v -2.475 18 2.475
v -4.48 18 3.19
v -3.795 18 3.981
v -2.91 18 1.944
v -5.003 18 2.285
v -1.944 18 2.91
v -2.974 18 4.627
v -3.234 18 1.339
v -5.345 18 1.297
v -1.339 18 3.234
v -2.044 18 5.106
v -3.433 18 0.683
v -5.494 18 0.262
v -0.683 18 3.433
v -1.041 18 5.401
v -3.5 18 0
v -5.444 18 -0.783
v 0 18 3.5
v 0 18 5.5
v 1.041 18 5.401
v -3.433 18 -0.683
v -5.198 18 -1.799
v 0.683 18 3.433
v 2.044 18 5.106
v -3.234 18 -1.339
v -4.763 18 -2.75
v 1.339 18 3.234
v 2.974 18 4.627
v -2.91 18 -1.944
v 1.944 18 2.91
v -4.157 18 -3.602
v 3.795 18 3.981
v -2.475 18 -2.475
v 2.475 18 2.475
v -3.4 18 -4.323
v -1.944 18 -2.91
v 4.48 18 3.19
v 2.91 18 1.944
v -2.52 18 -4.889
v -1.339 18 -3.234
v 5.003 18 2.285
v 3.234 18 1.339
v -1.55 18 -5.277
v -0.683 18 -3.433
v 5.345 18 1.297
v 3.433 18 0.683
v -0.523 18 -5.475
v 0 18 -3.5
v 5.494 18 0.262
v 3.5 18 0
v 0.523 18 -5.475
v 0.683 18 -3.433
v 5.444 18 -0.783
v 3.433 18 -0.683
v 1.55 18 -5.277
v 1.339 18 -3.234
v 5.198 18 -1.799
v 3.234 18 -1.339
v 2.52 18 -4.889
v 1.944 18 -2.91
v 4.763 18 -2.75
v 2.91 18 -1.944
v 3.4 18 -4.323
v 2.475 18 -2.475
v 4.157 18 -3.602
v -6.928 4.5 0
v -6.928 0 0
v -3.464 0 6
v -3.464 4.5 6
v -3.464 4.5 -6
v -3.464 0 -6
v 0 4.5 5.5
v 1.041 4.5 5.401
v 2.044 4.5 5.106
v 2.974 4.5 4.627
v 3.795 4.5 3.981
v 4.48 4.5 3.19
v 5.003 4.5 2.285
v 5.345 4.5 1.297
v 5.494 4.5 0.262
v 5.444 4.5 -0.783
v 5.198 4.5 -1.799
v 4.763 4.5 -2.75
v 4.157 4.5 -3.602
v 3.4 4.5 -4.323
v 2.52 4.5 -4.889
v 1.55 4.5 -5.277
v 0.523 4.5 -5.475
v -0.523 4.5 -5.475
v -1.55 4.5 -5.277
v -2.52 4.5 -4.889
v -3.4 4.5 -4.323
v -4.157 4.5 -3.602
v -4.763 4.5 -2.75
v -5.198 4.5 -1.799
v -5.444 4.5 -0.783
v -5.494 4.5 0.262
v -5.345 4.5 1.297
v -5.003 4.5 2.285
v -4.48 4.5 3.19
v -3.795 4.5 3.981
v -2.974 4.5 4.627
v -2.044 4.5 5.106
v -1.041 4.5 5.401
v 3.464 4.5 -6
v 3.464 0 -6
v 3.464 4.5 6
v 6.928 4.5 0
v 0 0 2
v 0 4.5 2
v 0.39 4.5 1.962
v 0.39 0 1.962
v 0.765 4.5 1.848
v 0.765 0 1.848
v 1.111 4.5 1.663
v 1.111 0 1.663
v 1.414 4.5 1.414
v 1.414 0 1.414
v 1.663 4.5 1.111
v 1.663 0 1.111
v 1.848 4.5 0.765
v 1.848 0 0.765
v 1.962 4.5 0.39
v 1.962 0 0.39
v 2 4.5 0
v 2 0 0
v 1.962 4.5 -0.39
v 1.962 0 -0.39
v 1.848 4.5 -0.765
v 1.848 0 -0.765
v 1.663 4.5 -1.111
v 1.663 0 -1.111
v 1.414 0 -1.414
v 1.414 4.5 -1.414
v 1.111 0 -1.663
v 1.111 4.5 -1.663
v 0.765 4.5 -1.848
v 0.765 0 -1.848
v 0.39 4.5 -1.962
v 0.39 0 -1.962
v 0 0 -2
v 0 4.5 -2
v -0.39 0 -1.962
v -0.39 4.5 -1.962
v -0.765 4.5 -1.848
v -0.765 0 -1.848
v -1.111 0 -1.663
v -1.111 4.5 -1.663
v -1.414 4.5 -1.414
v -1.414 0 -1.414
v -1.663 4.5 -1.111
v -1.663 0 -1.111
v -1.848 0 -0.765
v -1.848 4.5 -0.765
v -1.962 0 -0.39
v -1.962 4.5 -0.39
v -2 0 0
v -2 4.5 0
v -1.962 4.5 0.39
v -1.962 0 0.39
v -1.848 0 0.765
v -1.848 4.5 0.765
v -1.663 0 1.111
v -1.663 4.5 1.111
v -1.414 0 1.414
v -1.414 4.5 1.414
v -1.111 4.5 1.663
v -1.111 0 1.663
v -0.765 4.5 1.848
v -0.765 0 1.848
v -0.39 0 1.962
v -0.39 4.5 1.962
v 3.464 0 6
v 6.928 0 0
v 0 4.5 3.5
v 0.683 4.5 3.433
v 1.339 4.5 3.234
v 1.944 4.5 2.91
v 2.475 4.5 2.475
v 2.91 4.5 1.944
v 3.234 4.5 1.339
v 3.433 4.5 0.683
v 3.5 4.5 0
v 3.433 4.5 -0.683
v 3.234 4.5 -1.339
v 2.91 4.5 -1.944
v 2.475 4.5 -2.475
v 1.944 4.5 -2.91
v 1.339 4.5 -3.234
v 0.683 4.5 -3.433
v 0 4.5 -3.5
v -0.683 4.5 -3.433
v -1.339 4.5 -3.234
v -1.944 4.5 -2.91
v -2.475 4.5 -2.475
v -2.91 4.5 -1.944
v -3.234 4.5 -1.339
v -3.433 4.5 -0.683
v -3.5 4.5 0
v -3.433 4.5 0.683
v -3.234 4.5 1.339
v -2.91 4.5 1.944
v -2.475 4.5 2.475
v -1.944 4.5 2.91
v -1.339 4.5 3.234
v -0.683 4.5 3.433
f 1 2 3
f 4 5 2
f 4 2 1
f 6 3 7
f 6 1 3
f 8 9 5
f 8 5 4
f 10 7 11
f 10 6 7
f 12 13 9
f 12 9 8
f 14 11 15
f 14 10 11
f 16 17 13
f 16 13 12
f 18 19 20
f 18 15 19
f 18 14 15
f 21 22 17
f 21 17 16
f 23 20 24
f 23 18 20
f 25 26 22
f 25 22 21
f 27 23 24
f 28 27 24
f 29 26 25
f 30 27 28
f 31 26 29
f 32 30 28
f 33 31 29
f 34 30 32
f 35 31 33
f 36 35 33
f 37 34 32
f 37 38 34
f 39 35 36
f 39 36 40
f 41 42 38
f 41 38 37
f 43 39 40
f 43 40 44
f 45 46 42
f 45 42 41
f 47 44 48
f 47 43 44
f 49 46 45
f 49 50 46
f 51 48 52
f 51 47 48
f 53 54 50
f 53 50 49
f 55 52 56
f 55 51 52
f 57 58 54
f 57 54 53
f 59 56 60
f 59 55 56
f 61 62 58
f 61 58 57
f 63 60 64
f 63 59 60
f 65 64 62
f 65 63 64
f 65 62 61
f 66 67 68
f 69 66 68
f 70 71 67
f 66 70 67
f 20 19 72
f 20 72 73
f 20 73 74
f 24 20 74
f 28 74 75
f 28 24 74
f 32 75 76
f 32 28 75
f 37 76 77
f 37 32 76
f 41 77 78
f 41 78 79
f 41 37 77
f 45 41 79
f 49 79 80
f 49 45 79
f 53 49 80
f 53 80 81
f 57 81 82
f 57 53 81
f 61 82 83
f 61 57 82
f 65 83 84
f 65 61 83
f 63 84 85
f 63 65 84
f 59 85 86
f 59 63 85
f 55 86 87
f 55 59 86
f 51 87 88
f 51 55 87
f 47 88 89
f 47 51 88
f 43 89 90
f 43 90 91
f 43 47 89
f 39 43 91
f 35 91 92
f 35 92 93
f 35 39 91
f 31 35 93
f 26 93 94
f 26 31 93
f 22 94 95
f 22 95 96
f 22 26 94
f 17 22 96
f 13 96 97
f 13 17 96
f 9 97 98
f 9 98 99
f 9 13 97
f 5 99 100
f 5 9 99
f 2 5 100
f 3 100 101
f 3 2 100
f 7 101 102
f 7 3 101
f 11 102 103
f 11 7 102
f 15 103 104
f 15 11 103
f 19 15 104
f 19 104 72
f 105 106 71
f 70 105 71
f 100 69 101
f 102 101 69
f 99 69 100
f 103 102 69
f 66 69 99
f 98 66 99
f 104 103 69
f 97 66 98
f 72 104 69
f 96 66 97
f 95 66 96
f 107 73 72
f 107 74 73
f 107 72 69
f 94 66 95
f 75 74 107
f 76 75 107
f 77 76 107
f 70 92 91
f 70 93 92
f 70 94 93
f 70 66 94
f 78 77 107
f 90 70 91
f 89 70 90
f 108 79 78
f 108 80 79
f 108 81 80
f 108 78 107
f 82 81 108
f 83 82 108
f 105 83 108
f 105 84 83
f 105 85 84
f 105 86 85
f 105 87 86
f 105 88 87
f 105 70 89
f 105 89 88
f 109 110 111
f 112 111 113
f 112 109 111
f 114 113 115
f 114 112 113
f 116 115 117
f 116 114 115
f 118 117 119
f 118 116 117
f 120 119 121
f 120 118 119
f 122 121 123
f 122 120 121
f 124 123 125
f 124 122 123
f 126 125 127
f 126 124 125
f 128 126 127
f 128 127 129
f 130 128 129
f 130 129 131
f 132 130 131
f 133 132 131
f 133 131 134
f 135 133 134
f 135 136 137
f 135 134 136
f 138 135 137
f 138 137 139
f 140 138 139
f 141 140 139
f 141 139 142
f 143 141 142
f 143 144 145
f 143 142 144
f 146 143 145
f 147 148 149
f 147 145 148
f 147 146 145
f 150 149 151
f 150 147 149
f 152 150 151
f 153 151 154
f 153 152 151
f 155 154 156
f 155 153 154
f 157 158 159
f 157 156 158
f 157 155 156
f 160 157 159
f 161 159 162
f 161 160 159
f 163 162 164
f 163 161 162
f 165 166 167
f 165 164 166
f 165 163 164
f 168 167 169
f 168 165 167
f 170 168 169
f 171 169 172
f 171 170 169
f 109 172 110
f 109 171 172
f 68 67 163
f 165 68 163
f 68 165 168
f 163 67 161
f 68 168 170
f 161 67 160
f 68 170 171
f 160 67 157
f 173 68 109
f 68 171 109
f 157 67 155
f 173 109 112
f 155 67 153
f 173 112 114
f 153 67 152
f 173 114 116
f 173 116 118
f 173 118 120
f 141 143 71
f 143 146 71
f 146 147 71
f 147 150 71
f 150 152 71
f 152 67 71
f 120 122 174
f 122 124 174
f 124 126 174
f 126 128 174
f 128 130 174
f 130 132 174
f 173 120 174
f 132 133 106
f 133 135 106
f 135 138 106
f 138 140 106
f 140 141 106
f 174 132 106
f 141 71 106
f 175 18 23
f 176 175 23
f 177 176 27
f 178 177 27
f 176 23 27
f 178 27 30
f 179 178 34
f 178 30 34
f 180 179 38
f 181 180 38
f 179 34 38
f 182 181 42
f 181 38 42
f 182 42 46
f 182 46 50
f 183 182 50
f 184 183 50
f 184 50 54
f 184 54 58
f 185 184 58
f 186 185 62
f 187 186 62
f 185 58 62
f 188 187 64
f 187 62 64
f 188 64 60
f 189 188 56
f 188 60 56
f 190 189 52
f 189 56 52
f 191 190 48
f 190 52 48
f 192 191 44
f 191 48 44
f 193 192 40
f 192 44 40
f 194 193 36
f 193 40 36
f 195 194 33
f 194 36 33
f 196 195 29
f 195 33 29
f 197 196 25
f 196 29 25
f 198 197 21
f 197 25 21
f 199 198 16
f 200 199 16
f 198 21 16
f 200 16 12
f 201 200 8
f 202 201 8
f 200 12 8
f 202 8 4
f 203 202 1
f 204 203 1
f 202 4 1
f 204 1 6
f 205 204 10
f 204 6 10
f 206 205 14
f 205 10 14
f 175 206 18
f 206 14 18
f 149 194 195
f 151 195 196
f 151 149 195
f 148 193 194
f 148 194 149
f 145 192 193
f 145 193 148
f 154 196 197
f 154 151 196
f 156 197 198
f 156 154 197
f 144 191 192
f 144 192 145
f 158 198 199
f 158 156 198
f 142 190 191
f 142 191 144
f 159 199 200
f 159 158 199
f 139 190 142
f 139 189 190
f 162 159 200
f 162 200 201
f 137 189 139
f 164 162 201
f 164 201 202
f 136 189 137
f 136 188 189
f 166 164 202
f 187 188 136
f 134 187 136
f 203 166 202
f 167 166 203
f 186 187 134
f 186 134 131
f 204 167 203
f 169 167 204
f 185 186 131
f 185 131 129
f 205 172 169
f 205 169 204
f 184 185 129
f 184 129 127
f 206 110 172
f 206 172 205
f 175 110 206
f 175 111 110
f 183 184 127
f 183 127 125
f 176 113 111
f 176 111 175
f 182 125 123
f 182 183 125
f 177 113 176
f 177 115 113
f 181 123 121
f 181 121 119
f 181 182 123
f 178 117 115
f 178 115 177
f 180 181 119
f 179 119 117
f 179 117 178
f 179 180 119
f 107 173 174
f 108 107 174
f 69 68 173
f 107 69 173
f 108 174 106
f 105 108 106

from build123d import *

# Parameters (mm, degrees)
SKETCH_1_R          = 2
EXTRUDE_1_DEPTH     = 18
SKETCH_2_R          = 5.5
SKETCH_2_R_2        = 3.5
CUT_EXTRUDE_2_DEPTH = 13.5


with BuildPart() as part:
    # 草图1 → 凸台-拉伸1 (new body)
    with BuildSketch(Plane(origin=(0, 0, 0), x_dir=(1, 0, 0), z_dir=(0, 1, 0))):
        Polygon((6.92820323, 0), (3.464101615, 6), (-3.464101615, 6), (-6.92820323, 0), (-3.464101615, -6), (3.464101615, -6), align=None)
        with Locations(Location((0, 0, 0), (0, 0, 270))):
            Circle(SKETCH_1_R, mode=Mode.SUBTRACT)
    extrude(amount=EXTRUDE_1_DEPTH)

    # 草图2 → 切除-拉伸2 (cut)
    # profile 1 of 2: a face of its own
    with BuildSketch(Plane(origin=(0, 18, 0), x_dir=(1, 0, 0), z_dir=(0, 1, 0))):
        Polygon((-6.92820323, 0), (-3.464101615, -6), (3.464101615, -6), (6.92820323, 0), (3.464101615, 6), (-3.464101615, 6), align=None)
        with Locations(Location((0, 0, 0), (0, 0, 270))):
            Circle(SKETCH_2_R, mode=Mode.SUBTRACT)
    # profile 2 of 2: a face of its own
    with BuildSketch(Plane(origin=(0, 18, 0), x_dir=(1, 0, 0), z_dir=(0, 1, 0))):
        with Locations(Location((0, 0, 0), (0, 0, 270))):
            Circle(SKETCH_2_R_2)
    extrude(amount=-CUT_EXTRUDE_2_DEPTH, mode=Mode.SUBTRACT)


solid = part.part
